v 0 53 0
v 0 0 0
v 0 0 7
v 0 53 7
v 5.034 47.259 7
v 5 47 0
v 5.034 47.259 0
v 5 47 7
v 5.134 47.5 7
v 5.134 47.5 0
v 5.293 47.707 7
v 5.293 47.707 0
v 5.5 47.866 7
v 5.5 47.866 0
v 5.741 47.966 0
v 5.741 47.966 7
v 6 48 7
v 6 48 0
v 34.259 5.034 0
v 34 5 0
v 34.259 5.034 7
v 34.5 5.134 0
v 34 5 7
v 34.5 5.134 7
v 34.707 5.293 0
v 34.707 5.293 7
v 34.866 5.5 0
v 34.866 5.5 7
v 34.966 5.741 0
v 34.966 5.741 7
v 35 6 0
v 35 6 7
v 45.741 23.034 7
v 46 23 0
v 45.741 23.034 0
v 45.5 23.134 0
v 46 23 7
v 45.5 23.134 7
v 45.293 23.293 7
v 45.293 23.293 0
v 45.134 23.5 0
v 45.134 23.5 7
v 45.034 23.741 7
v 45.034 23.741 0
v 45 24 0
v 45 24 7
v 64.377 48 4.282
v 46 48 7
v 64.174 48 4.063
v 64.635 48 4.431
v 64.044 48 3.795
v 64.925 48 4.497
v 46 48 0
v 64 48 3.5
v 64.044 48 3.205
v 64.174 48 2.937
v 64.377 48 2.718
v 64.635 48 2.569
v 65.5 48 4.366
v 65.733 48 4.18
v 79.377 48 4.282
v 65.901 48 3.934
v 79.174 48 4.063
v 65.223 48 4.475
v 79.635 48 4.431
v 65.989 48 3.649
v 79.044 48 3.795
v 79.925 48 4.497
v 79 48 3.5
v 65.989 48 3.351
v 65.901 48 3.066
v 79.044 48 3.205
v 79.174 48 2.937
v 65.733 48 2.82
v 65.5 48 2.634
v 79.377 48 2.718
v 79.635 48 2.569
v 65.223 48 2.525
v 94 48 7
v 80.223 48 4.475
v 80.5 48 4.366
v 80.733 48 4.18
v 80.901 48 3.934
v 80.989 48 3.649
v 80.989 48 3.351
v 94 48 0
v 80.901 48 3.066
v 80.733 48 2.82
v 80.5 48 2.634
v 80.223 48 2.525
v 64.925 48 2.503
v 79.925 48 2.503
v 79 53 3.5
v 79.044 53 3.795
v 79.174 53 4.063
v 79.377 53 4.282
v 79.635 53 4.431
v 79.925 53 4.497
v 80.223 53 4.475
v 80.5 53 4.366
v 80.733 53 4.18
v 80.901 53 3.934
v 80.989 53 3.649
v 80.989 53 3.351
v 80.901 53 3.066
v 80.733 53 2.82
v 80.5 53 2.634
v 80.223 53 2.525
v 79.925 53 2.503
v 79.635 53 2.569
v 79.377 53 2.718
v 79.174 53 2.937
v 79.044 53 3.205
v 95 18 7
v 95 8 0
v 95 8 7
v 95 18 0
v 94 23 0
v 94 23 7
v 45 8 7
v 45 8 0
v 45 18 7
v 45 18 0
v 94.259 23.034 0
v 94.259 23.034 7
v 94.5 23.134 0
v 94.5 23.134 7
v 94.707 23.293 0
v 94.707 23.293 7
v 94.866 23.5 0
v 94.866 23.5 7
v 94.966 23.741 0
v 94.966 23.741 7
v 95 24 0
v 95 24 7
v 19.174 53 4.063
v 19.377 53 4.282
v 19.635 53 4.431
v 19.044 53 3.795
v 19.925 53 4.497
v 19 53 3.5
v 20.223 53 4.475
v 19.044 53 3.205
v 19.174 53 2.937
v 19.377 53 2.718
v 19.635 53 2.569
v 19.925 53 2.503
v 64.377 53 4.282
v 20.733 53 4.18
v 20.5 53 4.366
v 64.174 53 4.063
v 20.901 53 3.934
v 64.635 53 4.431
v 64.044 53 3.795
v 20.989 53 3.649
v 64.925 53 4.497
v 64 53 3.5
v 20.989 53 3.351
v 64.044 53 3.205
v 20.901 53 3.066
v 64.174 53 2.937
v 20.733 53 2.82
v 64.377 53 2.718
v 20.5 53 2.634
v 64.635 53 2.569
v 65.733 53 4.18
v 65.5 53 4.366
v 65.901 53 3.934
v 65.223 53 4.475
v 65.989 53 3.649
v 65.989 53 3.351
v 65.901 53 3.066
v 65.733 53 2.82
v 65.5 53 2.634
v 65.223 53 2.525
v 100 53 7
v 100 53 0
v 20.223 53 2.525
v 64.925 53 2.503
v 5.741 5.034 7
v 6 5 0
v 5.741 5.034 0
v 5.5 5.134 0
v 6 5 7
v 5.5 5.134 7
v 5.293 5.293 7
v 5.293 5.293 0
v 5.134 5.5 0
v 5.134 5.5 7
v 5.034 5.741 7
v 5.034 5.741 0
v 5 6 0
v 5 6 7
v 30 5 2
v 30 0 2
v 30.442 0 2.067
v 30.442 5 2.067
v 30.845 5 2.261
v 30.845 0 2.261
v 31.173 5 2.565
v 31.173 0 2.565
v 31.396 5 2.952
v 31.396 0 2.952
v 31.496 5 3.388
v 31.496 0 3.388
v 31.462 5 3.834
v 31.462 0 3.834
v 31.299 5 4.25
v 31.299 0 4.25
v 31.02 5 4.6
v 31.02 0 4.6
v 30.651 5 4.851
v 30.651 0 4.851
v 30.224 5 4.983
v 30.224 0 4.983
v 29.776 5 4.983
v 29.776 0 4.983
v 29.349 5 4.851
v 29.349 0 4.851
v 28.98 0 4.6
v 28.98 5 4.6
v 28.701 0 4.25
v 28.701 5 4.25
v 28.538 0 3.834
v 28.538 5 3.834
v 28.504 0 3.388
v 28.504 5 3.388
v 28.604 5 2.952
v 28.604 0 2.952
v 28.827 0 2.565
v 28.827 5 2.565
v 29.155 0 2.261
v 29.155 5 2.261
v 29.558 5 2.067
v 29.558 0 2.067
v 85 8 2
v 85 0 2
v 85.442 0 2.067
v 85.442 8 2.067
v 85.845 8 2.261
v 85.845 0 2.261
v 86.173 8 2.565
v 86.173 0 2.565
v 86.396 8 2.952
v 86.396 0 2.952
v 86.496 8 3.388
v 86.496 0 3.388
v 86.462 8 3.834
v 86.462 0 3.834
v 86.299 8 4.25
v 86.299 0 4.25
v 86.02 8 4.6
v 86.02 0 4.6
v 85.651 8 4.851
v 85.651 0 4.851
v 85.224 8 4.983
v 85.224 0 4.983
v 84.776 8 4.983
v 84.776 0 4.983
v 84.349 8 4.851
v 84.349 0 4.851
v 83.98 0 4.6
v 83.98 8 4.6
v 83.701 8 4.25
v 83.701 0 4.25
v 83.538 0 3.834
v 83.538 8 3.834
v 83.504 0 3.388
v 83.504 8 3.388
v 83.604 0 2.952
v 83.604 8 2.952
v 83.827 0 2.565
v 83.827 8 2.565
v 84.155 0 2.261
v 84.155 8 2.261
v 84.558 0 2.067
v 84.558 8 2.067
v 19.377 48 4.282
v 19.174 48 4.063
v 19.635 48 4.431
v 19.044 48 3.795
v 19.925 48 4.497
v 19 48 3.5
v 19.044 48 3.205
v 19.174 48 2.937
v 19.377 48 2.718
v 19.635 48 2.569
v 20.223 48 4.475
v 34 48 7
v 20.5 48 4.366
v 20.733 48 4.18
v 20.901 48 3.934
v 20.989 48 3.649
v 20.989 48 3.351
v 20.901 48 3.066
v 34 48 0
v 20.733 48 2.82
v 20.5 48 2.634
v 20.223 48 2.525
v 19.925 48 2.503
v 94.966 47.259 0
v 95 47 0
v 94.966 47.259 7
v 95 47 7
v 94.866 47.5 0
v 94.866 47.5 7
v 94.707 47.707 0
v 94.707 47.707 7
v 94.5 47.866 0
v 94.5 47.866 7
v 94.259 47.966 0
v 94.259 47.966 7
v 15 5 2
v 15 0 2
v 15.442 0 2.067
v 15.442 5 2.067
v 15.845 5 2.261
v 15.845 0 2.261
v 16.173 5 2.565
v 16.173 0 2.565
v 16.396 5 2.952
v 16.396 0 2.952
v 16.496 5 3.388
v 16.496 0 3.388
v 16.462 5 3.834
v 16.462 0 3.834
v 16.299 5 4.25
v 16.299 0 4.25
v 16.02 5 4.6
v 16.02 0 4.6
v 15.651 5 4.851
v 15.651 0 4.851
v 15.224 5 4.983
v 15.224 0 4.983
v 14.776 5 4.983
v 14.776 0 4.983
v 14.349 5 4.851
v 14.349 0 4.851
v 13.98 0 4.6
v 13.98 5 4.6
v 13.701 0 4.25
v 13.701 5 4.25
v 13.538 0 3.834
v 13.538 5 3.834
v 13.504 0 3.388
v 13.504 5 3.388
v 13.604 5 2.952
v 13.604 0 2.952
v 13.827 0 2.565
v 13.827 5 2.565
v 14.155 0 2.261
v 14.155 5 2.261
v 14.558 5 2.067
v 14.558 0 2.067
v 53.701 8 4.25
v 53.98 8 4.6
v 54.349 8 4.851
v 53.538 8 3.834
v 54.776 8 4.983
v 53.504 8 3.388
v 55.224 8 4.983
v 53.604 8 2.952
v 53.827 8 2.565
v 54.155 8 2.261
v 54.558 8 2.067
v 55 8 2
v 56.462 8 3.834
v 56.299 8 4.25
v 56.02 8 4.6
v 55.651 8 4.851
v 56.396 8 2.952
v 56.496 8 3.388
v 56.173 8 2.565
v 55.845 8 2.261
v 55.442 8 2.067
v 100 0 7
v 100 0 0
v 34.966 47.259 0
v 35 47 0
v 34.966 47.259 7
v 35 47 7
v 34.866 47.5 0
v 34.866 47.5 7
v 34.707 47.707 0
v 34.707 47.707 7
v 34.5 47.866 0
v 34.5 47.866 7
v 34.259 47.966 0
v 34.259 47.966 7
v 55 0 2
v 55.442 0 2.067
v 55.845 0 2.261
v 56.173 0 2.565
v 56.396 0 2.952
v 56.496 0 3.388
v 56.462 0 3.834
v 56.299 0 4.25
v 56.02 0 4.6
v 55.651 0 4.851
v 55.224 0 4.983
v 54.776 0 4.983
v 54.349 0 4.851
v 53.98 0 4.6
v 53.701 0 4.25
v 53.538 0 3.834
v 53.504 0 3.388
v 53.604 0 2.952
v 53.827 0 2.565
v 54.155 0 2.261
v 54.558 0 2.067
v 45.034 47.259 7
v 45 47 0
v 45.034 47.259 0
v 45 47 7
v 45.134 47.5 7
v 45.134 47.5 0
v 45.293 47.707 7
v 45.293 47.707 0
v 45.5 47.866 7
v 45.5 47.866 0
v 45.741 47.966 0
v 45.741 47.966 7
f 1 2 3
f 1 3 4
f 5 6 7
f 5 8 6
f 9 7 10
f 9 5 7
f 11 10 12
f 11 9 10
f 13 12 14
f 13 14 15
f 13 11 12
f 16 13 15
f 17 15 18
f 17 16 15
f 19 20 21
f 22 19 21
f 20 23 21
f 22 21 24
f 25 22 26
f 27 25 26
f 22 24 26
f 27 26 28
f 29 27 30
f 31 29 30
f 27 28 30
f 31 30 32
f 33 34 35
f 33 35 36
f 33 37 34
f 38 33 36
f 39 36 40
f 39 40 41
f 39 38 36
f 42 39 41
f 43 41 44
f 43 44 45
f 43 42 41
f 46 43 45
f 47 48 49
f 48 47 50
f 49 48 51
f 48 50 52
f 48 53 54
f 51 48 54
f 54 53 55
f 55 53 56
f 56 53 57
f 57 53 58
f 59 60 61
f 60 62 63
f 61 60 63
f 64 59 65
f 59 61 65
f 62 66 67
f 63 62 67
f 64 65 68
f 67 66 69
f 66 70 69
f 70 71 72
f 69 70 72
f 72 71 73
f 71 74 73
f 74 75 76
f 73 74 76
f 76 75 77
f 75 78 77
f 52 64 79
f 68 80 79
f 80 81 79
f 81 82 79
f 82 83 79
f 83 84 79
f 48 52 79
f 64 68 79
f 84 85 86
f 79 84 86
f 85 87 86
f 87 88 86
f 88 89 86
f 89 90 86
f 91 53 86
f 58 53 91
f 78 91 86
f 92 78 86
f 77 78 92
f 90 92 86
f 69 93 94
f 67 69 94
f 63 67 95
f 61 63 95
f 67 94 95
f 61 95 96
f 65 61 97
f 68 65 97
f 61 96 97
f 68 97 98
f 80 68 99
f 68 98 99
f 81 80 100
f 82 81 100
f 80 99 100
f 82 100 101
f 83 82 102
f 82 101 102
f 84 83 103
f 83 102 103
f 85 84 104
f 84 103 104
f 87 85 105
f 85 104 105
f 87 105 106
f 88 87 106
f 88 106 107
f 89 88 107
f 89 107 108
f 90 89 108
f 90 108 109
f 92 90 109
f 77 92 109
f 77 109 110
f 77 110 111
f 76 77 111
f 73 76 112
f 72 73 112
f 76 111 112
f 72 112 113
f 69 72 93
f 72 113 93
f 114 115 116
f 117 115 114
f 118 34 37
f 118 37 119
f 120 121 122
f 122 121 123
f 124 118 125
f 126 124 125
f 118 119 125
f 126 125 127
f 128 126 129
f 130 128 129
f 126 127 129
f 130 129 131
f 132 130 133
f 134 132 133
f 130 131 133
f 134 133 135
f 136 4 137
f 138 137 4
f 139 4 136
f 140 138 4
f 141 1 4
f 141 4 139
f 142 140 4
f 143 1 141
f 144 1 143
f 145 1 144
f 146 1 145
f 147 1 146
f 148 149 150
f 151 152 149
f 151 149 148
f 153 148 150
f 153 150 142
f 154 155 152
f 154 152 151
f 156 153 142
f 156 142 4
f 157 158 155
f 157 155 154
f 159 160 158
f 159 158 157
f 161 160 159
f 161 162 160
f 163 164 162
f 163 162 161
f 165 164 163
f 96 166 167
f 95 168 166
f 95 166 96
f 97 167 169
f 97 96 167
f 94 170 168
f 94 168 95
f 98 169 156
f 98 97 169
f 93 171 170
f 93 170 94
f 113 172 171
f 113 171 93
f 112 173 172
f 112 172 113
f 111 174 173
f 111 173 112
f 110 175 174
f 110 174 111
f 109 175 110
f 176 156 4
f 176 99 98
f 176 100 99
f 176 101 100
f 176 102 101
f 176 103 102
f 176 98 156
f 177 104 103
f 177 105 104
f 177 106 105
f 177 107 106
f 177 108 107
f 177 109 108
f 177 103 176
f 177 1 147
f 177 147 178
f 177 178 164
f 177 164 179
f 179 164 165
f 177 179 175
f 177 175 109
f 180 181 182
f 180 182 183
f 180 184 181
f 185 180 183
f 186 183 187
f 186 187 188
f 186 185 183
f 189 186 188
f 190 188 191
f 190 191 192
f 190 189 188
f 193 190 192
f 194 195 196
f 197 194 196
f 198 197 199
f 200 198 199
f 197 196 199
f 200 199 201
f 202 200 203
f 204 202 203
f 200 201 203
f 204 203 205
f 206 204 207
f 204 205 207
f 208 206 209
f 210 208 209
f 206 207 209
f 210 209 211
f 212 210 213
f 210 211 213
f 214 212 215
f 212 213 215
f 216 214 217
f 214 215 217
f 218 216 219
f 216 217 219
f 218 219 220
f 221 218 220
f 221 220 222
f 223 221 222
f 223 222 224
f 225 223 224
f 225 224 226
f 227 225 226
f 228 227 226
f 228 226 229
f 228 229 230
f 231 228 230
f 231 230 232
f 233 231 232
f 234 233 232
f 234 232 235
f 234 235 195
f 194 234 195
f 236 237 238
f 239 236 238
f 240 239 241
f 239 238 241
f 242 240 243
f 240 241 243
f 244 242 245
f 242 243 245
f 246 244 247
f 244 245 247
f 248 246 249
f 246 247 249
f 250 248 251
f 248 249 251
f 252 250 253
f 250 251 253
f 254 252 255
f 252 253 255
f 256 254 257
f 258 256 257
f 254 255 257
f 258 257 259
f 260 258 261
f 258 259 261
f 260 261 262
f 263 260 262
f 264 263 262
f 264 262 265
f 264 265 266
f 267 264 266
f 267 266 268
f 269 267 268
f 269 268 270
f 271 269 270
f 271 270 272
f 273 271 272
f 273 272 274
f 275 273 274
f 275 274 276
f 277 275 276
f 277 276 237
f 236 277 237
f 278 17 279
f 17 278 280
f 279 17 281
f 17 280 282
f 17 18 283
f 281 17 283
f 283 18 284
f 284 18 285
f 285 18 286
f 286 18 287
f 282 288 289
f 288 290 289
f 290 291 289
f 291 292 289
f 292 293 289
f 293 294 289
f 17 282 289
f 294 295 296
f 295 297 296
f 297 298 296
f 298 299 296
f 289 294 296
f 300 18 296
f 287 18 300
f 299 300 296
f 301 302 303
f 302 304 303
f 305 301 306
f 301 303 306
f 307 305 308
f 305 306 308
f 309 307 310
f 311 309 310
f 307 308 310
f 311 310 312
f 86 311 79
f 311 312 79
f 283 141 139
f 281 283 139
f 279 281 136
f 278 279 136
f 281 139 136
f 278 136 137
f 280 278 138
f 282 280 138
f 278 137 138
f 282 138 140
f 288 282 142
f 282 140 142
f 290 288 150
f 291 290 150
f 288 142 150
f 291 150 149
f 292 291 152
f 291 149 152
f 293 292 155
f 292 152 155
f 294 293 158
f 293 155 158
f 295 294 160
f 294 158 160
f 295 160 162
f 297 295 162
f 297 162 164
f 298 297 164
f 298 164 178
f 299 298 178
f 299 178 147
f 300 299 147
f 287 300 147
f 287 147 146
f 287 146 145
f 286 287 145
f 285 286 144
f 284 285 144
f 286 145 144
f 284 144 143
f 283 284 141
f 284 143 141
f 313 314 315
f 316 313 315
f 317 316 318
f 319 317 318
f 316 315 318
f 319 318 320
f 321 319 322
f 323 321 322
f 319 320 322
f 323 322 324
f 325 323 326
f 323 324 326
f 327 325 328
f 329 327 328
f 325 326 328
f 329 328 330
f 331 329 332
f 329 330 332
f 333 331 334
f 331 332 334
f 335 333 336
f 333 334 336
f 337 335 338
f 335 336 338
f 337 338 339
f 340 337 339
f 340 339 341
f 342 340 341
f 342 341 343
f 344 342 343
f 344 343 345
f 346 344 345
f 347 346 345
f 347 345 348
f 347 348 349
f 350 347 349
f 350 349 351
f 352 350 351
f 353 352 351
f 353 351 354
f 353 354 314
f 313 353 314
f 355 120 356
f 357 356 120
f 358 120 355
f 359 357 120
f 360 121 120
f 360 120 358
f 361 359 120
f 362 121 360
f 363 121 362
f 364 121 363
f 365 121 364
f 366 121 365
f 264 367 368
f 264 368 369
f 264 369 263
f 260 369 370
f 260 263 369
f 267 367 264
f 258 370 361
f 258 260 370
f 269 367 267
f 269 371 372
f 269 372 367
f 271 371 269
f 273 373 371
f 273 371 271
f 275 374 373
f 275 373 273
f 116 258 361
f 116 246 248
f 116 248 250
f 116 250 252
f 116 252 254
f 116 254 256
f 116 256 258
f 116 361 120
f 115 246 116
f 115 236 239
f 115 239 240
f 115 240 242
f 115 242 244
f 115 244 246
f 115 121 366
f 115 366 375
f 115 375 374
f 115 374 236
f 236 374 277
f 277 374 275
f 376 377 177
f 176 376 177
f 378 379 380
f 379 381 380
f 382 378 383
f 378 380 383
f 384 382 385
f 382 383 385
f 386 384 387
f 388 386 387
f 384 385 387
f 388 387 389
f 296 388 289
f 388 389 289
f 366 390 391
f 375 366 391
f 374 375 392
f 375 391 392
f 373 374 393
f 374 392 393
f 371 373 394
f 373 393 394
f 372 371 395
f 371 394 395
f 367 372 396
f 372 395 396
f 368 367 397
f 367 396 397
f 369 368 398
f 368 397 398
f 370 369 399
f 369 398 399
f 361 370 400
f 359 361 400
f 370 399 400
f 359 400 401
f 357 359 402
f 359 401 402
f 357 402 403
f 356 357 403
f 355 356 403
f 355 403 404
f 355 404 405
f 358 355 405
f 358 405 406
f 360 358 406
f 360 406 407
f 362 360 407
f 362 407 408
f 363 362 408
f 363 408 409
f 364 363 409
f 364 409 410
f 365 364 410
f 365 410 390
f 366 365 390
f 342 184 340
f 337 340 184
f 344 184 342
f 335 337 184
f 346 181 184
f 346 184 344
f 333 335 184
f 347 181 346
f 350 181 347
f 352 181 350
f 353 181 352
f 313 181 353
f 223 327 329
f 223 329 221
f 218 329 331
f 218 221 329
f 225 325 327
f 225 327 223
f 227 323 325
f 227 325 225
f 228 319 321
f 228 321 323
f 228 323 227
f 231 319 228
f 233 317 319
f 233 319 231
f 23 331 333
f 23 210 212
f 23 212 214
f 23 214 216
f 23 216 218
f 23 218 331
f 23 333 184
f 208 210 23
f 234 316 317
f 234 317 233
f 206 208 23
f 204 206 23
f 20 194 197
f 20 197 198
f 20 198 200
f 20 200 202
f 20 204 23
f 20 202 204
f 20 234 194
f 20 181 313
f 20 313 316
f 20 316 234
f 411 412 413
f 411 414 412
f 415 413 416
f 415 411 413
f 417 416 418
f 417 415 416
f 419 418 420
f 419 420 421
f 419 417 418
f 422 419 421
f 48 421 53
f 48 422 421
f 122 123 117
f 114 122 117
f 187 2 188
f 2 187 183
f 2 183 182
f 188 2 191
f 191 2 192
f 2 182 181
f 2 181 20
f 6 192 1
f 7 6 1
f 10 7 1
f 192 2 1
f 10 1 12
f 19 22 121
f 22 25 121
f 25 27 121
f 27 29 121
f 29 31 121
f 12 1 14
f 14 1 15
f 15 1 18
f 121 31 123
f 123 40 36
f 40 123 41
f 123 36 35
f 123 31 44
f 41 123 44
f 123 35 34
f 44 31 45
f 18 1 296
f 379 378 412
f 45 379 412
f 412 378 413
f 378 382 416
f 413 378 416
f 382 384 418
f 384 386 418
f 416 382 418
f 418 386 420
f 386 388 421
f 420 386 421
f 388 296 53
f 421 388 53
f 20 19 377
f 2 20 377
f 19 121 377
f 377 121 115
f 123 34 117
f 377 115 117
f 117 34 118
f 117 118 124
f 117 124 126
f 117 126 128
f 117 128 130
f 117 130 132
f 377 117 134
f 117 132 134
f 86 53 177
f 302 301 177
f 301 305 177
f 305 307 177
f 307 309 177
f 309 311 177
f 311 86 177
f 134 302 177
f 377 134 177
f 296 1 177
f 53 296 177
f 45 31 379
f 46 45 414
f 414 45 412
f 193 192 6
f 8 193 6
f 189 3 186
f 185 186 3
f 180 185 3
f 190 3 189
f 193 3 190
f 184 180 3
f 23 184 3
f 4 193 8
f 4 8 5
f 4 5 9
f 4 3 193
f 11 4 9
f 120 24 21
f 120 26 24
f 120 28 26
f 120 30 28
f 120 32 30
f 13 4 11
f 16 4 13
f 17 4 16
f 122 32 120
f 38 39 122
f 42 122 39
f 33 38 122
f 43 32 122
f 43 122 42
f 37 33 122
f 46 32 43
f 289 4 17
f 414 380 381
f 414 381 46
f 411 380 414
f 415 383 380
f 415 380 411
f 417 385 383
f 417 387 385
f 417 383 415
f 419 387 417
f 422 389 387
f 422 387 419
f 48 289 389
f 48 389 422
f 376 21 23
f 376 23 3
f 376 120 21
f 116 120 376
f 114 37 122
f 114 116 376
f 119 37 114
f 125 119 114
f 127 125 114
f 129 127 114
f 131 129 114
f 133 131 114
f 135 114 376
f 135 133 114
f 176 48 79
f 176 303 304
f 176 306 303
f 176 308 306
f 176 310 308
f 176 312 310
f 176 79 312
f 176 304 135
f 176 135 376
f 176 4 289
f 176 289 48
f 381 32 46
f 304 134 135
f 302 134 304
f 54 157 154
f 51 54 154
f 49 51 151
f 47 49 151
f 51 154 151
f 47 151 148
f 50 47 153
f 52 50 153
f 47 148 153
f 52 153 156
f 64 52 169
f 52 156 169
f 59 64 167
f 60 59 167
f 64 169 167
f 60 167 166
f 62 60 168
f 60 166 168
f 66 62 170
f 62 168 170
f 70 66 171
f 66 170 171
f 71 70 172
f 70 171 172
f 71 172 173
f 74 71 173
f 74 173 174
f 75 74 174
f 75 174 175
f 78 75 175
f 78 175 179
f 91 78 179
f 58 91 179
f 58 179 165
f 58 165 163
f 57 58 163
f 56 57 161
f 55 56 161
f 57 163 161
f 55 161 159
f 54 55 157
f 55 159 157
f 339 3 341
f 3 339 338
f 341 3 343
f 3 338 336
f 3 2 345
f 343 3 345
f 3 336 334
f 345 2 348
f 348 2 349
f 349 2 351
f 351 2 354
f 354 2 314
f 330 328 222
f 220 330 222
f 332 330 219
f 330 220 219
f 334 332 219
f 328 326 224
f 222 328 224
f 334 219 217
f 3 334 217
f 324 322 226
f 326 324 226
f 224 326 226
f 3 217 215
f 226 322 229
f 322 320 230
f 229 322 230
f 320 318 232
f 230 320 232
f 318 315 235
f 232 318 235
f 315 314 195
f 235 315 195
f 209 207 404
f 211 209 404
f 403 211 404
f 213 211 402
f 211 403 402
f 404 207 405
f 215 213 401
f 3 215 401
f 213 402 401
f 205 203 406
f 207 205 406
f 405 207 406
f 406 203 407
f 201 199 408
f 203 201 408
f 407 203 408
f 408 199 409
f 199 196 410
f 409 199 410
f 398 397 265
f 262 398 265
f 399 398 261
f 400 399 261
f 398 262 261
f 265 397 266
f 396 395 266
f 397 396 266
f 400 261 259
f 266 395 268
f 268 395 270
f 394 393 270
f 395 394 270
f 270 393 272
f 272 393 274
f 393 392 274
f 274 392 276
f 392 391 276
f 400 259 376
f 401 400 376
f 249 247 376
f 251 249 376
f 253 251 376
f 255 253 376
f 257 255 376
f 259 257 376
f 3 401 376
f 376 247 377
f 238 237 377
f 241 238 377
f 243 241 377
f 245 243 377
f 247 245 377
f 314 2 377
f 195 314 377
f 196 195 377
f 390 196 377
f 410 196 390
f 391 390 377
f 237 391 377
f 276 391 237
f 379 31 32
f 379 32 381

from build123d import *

# Parameters (mm, degrees)
SKETCH_1_W          = 100
SKETCH_1_H          = 53
SKETCH_1_W_2        = 30
SKETCH_1_H_2        = 43
SKETCH_1_W_3        = 50
SKETCH_1_H_3        = 25
SKETCH_1_H_4        = 10
EXTRUDE_1_DEPTH     = 7
FILLET_1_R          = 1
CUT_EXTRUDE_2_REACH = 115.393
SKETCH_2_R          = 1.5
SKETCH_3_R          = 1
CUT_EXTRUDE_3_DEPTH = 5


with BuildPart() as part:
    # 草图1 → 凸台-拉伸1 (new body)
    with BuildSketch(Plane.XY):
        with Locations((50, 26.5)):
            Rectangle(SKETCH_1_W, SKETCH_1_H)
        with Locations((20, 26.5)):
            Rectangle(SKETCH_1_W_2, SKETCH_1_H_2, mode=Mode.SUBTRACT)
        with Locations((70, 35.5)):
            Rectangle(SKETCH_1_W_3, SKETCH_1_H_3, mode=Mode.SUBTRACT)
        with Locations((70, 13)):
            Rectangle(SKETCH_1_W_3, SKETCH_1_H_4, mode=Mode.SUBTRACT)
    extrude(amount=EXTRUDE_1_DEPTH)

    # 圆角1
    fillet_1_edges = [part.edges().sort_by_distance(p)[0] for p in [
        (35, 48, 3.5),
        (5, 48, 3.5),
        (5, 5, 3.5),
        (35, 5, 3.5),
        (95, 48, 3.5),
        (45, 48, 3.5),
        (45, 23, 3.5),
        (95, 23, 3.5),
    ]]
    fillet(fillet_1_edges, radius=FILLET_1_R)

    # 草图2 → 切除-拉伸2 (cut, up to next)
    with BuildSketch(Plane.XZ, mode=Mode.PRIVATE) as cut_extrude_2_sk1:
        with Locations(Location((15, 3.5, 0), (0, 0, 270))):
            Circle(SKETCH_2_R)
    cut_extrude_2_tool1 = extrude(cut_extrude_2_sk1.sketch, amount=-CUT_EXTRUDE_2_REACH, mode=Mode.PRIVATE) & part.part
    # 草图2 → 切除-拉伸2 (cut, up to next)
    with BuildSketch(Plane.XZ, mode=Mode.PRIVATE) as cut_extrude_2_sk2:
        with Locations(Location((85, 3.5, 0), (0, 0, 270))):
            Circle(SKETCH_2_R)
    cut_extrude_2_tool2 = extrude(cut_extrude_2_sk2.sketch, amount=-CUT_EXTRUDE_2_REACH, mode=Mode.PRIVATE) & part.part
    # 草图2 → 切除-拉伸2 (cut, up to next)
    with BuildSketch(Plane.XZ, mode=Mode.PRIVATE) as cut_extrude_2_sk3:
        with Locations(Location((55, 3.5, 0), (0, 0, 270))):
            Circle(SKETCH_2_R)
    cut_extrude_2_tool3 = extrude(cut_extrude_2_sk3.sketch, amount=-CUT_EXTRUDE_2_REACH, mode=Mode.PRIVATE) & part.part
    # 草图2 → 切除-拉伸2 (cut, up to next)
    with BuildSketch(Plane.XZ, mode=Mode.PRIVATE) as cut_extrude_2_sk4:
        with Locations(Location((30, 3.5, 0), (0, 0, 270))):
            Circle(SKETCH_2_R)
    cut_extrude_2_tool4 = extrude(cut_extrude_2_sk4.sketch, amount=-CUT_EXTRUDE_2_REACH, mode=Mode.PRIVATE) & part.part
    add(cut_extrude_2_tool1.solids().sort_by_distance((15, 0, 3.5))[0], mode=Mode.SUBTRACT)
    add(cut_extrude_2_tool2.solids().sort_by_distance((85, 0, 3.5))[0], mode=Mode.SUBTRACT)
    add(cut_extrude_2_tool3.solids().sort_by_distance((55, 0, 3.5))[0], mode=Mode.SUBTRACT)
    add(cut_extrude_2_tool4.solids().sort_by_distance((30, 0, 3.5))[0], mode=Mode.SUBTRACT)

    # 草图3 → 切除-拉伸3 (cut)
    with BuildSketch(Plane(origin=(0, 53, 0), x_dir=(1, 0, 0), z_dir=(0, 1, 0))):
        with Locations(Location((80, -3.5, 0), (0, 0, 180))):
            Circle(SKETCH_3_R)
        with Locations(Location((65, -3.5, 0), (0, 0, 180))):
            Circle(SKETCH_3_R)
        with Locations(Location((20, -3.5, 0), (0, 0, 180))):
            Circle(SKETCH_3_R)
    extrude(amount=-CUT_EXTRUDE_3_DEPTH, mode=Mode.SUBTRACT)


solid = part.part
